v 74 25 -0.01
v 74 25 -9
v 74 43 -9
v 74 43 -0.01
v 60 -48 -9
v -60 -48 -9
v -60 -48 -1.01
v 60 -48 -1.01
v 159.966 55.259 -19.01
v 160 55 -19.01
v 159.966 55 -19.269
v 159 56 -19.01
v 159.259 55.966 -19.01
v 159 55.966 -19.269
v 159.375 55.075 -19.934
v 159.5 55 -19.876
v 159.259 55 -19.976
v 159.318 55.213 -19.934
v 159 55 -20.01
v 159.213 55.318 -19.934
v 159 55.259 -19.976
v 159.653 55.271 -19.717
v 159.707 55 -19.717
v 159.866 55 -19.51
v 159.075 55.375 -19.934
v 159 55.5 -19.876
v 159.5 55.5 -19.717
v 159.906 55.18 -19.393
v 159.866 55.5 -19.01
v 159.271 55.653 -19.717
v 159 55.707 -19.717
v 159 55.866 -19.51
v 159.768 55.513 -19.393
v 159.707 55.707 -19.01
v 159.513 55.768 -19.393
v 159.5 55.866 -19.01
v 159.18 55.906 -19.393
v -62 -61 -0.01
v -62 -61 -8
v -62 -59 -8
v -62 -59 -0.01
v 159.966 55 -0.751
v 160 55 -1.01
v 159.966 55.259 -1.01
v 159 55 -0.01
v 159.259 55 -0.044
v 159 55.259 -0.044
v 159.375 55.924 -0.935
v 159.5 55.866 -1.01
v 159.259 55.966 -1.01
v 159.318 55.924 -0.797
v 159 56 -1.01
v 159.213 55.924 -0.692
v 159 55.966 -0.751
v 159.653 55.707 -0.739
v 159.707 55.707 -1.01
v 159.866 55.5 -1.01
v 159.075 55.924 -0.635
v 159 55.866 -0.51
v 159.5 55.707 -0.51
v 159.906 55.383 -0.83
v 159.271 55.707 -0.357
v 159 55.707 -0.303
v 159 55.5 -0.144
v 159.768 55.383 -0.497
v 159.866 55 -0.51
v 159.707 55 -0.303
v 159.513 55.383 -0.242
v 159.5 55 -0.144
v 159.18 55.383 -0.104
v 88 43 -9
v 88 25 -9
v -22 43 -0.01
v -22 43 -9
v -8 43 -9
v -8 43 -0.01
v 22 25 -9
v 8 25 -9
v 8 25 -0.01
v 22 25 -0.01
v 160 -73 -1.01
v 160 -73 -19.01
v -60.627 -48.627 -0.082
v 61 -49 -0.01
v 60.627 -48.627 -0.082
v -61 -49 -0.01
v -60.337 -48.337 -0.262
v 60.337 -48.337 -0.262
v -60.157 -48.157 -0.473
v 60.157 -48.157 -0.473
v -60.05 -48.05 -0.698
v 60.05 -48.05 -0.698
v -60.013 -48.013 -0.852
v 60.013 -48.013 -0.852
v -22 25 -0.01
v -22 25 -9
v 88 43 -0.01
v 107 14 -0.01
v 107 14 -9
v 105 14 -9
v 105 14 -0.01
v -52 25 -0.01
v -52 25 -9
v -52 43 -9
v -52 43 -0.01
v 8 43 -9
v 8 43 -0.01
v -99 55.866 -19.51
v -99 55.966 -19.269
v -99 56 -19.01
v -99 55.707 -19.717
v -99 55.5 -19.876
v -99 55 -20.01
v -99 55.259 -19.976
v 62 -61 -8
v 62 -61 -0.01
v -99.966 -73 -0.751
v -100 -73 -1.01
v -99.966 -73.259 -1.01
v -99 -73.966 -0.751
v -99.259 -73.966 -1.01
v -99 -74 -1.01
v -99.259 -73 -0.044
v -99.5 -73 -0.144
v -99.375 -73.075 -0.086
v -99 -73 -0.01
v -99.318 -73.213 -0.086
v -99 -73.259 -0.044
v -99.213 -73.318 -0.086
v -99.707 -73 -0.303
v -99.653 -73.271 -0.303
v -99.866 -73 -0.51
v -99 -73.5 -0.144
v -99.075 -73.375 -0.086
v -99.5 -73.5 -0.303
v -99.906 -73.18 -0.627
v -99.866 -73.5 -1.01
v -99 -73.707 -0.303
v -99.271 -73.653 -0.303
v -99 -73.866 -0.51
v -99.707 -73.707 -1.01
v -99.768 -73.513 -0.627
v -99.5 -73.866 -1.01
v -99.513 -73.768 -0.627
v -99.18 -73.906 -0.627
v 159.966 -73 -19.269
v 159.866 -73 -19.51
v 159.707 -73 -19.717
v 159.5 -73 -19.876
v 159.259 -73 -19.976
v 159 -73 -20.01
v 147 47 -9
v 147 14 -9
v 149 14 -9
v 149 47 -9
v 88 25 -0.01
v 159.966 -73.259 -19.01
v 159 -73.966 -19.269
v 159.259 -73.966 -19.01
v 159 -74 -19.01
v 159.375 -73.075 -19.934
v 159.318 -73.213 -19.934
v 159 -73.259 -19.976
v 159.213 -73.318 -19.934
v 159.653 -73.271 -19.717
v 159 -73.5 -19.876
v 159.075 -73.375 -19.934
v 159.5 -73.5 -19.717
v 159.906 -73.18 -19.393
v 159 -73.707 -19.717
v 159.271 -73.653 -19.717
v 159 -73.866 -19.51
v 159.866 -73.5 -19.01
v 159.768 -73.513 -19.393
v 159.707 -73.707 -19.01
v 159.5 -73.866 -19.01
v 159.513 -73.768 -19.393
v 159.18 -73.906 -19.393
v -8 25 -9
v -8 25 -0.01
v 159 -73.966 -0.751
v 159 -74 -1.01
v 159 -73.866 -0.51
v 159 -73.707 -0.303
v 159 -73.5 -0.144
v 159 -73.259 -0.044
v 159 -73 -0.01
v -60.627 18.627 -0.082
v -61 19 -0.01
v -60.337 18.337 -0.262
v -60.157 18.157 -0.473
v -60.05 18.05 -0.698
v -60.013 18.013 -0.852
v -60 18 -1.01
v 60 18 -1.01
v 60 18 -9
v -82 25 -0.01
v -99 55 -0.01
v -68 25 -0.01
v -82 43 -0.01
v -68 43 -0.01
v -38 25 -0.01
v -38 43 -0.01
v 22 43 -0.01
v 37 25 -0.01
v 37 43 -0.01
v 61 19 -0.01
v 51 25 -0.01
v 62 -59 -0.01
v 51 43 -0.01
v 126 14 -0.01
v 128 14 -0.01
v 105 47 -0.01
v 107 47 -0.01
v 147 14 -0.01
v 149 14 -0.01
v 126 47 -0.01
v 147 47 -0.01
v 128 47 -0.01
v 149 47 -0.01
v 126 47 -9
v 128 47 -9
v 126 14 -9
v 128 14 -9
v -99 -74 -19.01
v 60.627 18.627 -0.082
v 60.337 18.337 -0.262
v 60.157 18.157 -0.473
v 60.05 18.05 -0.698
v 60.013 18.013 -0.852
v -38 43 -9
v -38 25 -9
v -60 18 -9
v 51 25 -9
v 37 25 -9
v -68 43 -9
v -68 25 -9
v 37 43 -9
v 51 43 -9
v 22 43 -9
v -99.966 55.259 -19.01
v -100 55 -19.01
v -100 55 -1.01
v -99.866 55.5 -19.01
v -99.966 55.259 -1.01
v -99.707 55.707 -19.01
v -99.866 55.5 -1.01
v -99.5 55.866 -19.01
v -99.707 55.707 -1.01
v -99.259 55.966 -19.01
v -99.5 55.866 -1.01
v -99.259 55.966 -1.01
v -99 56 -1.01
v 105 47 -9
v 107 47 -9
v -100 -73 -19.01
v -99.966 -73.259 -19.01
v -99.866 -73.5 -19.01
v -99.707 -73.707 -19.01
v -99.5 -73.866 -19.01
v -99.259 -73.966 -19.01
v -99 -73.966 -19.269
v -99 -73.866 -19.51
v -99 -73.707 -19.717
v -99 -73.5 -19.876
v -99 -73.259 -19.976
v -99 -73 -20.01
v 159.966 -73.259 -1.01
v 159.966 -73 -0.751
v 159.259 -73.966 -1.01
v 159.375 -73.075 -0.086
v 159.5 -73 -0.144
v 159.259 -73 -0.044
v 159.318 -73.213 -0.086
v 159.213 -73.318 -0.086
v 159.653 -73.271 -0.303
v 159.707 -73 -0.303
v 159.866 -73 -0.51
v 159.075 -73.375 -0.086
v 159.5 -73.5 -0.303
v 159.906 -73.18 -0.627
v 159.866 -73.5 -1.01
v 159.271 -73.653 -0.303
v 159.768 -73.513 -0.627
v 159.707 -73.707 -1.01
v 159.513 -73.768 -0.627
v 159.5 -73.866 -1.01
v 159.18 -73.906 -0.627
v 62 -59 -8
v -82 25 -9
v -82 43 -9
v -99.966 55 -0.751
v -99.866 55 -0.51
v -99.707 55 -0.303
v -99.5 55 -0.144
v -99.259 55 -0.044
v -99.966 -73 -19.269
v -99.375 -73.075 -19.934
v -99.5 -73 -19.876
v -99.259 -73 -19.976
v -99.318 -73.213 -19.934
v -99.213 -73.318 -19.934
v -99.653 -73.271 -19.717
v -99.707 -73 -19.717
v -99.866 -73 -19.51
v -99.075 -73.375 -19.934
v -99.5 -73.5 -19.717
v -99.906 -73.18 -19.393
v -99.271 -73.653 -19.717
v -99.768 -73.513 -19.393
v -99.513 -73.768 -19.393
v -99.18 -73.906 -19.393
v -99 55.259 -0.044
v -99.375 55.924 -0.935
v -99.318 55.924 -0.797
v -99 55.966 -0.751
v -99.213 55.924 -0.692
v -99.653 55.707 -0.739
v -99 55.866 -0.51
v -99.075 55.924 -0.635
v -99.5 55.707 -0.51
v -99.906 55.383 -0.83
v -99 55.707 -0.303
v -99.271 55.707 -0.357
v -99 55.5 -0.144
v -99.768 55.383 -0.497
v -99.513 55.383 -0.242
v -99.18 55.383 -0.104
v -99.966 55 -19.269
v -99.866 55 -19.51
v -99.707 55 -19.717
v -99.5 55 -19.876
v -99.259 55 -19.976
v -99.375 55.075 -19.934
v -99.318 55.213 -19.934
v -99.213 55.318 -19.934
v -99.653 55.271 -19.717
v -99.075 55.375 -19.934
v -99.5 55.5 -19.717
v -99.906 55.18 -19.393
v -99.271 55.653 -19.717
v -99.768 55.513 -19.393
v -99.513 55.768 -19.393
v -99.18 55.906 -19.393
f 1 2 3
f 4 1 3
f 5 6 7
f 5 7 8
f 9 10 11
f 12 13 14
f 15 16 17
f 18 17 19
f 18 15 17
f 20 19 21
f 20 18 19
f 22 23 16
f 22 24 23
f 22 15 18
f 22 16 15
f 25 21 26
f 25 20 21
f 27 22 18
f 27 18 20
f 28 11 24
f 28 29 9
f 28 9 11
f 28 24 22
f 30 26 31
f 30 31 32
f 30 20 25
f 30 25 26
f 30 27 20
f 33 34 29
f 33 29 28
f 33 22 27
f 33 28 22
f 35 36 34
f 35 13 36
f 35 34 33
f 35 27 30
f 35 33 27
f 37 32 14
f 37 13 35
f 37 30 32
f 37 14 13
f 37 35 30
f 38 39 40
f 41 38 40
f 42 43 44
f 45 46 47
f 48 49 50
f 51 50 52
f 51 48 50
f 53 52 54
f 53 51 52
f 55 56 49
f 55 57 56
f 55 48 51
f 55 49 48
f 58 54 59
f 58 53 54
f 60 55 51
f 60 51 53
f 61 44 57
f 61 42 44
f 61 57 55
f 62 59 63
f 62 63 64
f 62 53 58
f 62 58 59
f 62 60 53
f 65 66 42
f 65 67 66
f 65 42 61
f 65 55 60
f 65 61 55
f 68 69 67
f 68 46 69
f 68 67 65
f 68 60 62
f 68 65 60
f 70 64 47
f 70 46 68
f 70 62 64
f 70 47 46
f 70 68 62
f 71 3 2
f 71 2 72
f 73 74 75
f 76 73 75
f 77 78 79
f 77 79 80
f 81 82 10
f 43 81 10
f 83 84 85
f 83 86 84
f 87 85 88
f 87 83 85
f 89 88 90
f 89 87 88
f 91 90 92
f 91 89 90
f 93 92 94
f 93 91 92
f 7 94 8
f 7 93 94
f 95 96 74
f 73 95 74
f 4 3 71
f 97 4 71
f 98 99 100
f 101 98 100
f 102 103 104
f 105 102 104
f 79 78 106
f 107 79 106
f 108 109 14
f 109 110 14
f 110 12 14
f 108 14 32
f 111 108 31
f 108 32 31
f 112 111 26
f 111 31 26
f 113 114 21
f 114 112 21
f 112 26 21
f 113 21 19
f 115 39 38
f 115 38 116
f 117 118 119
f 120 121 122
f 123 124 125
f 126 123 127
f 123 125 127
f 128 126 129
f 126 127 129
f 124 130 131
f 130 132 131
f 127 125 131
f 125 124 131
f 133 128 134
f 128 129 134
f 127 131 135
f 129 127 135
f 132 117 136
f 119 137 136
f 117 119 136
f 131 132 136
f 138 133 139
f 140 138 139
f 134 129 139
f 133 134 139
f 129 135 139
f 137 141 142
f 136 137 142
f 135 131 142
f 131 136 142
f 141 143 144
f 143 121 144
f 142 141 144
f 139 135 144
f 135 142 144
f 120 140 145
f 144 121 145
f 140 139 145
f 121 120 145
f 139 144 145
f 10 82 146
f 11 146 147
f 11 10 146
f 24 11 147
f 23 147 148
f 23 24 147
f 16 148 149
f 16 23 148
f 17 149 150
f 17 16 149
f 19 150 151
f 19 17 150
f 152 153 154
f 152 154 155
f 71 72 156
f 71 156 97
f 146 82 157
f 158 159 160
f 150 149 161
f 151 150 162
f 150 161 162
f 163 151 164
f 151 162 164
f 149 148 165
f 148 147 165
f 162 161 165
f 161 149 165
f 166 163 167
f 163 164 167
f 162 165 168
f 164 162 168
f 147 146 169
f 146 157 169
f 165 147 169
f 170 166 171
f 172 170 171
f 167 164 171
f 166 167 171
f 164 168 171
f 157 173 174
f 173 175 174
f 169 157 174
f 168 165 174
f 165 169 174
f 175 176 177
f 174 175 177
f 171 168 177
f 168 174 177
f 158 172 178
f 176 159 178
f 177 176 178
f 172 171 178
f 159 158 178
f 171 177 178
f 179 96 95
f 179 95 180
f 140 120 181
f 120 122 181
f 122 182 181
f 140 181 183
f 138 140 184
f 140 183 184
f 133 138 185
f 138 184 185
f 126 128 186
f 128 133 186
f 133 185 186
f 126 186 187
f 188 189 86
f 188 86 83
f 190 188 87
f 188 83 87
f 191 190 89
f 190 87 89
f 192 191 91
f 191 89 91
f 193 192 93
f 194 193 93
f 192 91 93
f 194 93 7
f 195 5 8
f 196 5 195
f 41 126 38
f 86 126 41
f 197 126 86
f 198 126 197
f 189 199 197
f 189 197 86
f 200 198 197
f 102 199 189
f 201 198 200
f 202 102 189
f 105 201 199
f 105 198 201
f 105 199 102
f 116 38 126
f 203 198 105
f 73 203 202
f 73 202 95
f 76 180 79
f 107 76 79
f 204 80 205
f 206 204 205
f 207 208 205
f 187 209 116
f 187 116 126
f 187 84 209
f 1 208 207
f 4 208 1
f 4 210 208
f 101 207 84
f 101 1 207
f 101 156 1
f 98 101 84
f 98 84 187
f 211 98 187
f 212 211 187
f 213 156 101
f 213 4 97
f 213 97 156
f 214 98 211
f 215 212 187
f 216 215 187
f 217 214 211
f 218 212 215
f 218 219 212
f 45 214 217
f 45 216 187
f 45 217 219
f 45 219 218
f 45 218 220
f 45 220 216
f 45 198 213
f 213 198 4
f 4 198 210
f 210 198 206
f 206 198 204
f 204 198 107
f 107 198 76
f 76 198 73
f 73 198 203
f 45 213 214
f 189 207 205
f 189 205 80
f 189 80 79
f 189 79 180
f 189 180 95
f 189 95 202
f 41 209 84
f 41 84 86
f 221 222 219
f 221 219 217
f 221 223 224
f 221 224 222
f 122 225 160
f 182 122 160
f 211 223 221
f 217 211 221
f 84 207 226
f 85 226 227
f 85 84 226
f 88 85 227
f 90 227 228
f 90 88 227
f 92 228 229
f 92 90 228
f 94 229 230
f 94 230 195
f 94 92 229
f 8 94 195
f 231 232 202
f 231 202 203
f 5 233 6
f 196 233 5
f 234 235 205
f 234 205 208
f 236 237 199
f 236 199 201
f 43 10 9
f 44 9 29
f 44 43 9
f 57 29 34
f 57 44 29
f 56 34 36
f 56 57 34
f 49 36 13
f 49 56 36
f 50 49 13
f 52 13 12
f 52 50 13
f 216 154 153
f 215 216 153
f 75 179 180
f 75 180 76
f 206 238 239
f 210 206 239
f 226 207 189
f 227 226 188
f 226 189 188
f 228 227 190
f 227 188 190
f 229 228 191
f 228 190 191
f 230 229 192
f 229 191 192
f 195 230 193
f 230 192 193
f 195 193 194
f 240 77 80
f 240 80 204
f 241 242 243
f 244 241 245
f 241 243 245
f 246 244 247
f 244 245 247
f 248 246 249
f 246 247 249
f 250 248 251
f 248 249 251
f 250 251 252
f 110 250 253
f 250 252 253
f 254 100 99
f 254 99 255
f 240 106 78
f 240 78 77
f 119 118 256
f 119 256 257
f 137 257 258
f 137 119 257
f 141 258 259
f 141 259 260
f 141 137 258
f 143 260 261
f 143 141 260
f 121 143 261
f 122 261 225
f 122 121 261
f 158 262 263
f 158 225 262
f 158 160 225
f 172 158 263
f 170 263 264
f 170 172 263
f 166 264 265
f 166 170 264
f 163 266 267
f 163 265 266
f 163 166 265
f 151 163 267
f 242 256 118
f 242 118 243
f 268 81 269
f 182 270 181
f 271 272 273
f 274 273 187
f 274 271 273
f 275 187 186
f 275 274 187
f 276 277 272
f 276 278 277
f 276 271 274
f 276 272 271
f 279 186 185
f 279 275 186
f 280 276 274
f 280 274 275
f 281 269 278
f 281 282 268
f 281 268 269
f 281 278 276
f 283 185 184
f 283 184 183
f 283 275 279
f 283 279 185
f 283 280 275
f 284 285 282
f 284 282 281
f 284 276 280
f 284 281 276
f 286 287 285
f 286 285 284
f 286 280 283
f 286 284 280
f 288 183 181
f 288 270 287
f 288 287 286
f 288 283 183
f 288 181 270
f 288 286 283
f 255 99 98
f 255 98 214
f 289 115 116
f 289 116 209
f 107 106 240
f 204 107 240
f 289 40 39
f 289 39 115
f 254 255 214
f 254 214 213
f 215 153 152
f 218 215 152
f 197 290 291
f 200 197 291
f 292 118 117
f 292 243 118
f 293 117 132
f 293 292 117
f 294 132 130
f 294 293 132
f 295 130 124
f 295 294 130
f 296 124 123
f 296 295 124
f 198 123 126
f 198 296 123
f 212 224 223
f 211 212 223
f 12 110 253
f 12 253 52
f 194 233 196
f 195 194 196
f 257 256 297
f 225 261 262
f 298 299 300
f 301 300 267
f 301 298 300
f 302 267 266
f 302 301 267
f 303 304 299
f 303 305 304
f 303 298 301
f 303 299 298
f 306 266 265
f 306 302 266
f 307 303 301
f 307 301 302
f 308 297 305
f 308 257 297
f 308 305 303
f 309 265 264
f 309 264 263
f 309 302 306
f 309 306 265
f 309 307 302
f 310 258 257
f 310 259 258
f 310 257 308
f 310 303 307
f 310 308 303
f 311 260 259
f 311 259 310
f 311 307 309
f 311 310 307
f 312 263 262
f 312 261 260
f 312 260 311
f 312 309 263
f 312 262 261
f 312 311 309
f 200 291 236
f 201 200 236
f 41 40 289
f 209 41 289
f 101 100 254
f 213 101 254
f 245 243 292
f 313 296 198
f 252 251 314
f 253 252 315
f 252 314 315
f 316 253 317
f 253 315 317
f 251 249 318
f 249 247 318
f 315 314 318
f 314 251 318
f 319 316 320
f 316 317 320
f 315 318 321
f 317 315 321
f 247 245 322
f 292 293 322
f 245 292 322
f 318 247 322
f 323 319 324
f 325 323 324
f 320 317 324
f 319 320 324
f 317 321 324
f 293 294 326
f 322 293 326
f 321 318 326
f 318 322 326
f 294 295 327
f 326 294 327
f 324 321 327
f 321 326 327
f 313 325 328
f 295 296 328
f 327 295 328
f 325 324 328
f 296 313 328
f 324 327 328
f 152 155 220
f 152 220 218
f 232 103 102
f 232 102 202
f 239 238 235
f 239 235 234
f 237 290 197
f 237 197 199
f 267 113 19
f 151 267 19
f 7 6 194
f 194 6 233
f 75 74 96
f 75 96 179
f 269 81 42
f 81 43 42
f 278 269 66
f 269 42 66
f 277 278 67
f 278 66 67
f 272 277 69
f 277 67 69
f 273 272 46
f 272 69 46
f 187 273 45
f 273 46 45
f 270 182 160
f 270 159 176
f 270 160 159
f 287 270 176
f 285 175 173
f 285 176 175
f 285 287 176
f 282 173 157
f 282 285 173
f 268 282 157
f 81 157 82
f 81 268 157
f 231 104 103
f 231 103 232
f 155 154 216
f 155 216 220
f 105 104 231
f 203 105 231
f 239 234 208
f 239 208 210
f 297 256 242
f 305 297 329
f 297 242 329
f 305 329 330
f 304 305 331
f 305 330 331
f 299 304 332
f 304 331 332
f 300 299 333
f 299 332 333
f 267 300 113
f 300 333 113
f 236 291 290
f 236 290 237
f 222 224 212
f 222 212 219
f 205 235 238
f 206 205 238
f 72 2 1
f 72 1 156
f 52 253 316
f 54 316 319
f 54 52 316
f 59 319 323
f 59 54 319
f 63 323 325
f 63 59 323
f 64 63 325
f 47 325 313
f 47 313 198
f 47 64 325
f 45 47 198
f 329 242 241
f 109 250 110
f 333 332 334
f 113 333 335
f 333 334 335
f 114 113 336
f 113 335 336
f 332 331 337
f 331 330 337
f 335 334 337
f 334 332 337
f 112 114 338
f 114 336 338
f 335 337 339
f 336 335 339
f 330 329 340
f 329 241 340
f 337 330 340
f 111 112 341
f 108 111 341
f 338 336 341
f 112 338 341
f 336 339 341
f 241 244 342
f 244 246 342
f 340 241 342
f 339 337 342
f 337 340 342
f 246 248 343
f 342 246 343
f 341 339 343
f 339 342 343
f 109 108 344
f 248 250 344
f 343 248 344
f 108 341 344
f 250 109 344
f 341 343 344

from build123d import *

# Parameters (mm, degrees)
BOX013_W               = 120
BOX013_H               = 66
BOX013_DEPTH           = 10
BOX002_W               = 14
BOX002_H               = 18
BOX002_DEPTH           = 10
BOX003_W               = 14
BOX003_H               = 18
BOX003_DEPTH           = 10
BOX004_W               = 14
BOX004_H               = 18
BOX004_DEPTH           = 10
BOX005_W               = 14
BOX005_H               = 18
BOX005_DEPTH           = 10
BOX006_W               = 33
BOX006_H               = 2
BOX006_DEPTH           = 10
BOX006_PLACEMENT_ANGLE = 90
BOX009_W               = 33
BOX009_H               = 2
BOX009_DEPTH           = 10
BOX009_PLACEMENT_ANGLE = 90
BOX010_W               = 33
BOX010_H               = 2
BOX010_DEPTH           = 10
BOX010_PLACEMENT_ANGLE = 90
BOX015_W               = 14
BOX015_H               = 18
BOX015_DEPTH           = 10
BOX022_W               = 14
BOX022_H               = 18
BOX022_DEPTH           = 10
BOX001_W               = 124
BOX001_H               = 2
BOX001_DEPTH           = 10
BOX_W                  = 260
BOX_H                  = 130
BOX_DEPTH              = 20
FILLET004_R            = 1
FILLET_R               = 1


with BuildPart() as cube003:
    # Box013 → Box013 (new body)
    with BuildSketch(Plane(origin=(-60, -48, -9), x_dir=(1, 0, 0), z_dir=(0, 0, 1))):
        with Locations((60, 33)):
            Rectangle(BOX013_W, BOX013_H)
    extrude(amount=BOX013_DEPTH)


with BuildPart() as btn4_hole:
    # Box002 → Box002 (new body)
    with BuildSketch(Plane(origin=(8, 25, -9), x_dir=(1, 0, 0), z_dir=(0, 0, 1))):
        with Locations((7, 9)):
            Rectangle(BOX002_W, BOX002_H)
    extrude(amount=BOX002_DEPTH)


with BuildPart() as btn3_hole:
    # Box003 → Box003 (new body)
    with BuildSketch(Plane(origin=(-22, 25, -9), x_dir=(1, 0, 0), z_dir=(0, 0, 1))):
        with Locations((7, 9)):
            Rectangle(BOX003_W, BOX003_H)
    extrude(amount=BOX003_DEPTH)


with BuildPart() as btn2_hole:
    # Box004 → Box004 (new body)
    with BuildSketch(Plane(origin=(-52, 25, -9), x_dir=(1, 0, 0), z_dir=(0, 0, 1))):
        with Locations((7, 9)):
            Rectangle(BOX004_W, BOX004_H)
    extrude(amount=BOX004_DEPTH)


with BuildPart() as btn1_hole:
    # Box005 → Box005 (new body)
    with BuildSketch(Plane(origin=(-82, 25, -9), x_dir=(1, 0, 0), z_dir=(0, 0, 1))):
        with Locations((7, 9)):
            Rectangle(BOX005_W, BOX005_H)
    extrude(amount=BOX005_DEPTH)


with BuildPart() as cf_red_hole:
    # Box006 → Box006 (new body)
    with BuildSketch(Plane.XY):
        with Locations((16.5, 1)):
            Rectangle(BOX006_W, BOX006_H)
    extrude(amount=BOX006_DEPTH)


with BuildPart() as cf_red_hole_1:
    # Box006 placement: moved
    add(cf_red_hole.part.moved(Location((107, 14, -9))).rotate(Axis((107, 14, -9), (0, 0, 1)), BOX006_PLACEMENT_ANGLE))


with BuildPart() as cf_green_hole:
    # Box009 → Box009 (new body)
    with BuildSketch(Plane.XY):
        with Locations((16.5, 1)):
            Rectangle(BOX009_W, BOX009_H)
    extrude(amount=BOX009_DEPTH)


with BuildPart() as cf_green_hole_1:
    # Box009 placement: moved
    add(cf_green_hole.part.moved(Location((128, 14, -9))).rotate(Axis((128, 14, -9), (0, 0, 1)), BOX009_PLACEMENT_ANGLE))


with BuildPart() as cf_blue_hole:
    # Box010 → Box010 (new body)
    with BuildSketch(Plane.XY):
        with Locations((16.5, 1)):
            Rectangle(BOX010_W, BOX010_H)
    extrude(amount=BOX010_DEPTH)


with BuildPart() as cf_blue_hole_1:
    # Box010 placement: moved
    add(cf_blue_hole.part.moved(Location((149, 14, -9))).rotate(Axis((149, 14, -9), (0, 0, 1)), BOX010_PLACEMENT_ANGLE))


with BuildPart() as modbtnhole:
    # Box015 → Box015 (new body)
    with BuildSketch(Plane(origin=(74, 25, -9), x_dir=(1, 0, 0), z_dir=(0, 0, 1))):
        with Locations((7, 9)):
            Rectangle(BOX015_W, BOX015_H)
    extrude(amount=BOX015_DEPTH)


with BuildPart() as btn5_hole:
    # Box022 → Box022 (new body)
    with BuildSketch(Plane(origin=(37, 25, -9), x_dir=(1, 0, 0), z_dir=(0, 0, 1))):
        with Locations((7, 9)):
            Rectangle(BOX022_W, BOX022_H)
    extrude(amount=BOX022_DEPTH)


with BuildPart() as holes:
    # Box001 → Box001 (new body)
    with BuildSketch(Plane(origin=(-62, -61, -8), x_dir=(1, 0, 0), z_dir=(0, 0, 1))):
        with Locations((62, 1)):
            Rectangle(BOX001_W, BOX001_H)
    extrude(amount=BOX001_DEPTH)

    # Fusion: union Btn4-Hole, Btn3-Hole, Btn2-Hole, Btn1-Hole, CF-Red-Hole, CF-Green-Hole, CF-Blue-Hole, ModBtnHole, Btn5-Hole
    add(btn4_hole.part)
    add(btn3_hole.part)
    add(btn2_hole.part)
    add(btn1_hole.part)
    add(cf_red_hole_1.part)
    add(cf_green_hole_1.part)
    add(cf_blue_hole_1.part)
    add(modbtnhole.part)
    add(btn5_hole.part)


with BuildPart() as box:
    # Box → Box (new body)
    with BuildSketch(Plane(origin=(-100, -74, -20.01), x_dir=(1, 0, 0), z_dir=(0, 0, 1))):
        with Locations((130, 65)):
            Rectangle(BOX_W, BOX_H)
    extrude(amount=BOX_DEPTH)

    # Fillet004
    fillet004_edges = [box.edges().sort_by_distance(p)[0] for p in [
        (-100, -74, -10.01),
        (-100, -9, -0.01),
        (-100, 56, -10.01),
        (-100, -9, -20.01),
        (160, -74, -10.01),
        (160, -9, -0.01),
        (160, 56, -10.01),
        (160, -9, -20.01),
        (30, -74, -20.01),
        (30, -74, -0.01),
        (30, 56, -20.01),
        (30, 56, -0.01),
    ]]
    fillet(fillet004_edges, radius=FILLET004_R)

    # Cut016: cut Holes
    add(holes.part, mode=Mode.SUBTRACT)

    # Cut: cut Cube003
    add(cube003.part, mode=Mode.SUBTRACT)

    # Fillet
    fillet_edges = [box.edges().sort_by_distance(p)[0] for p in [
        (0, -48, -0.01),
        (60, -15, -0.01),
        (0, 18, -0.01),
        (-60, -15, -0.01),
    ]]
    fillet(fillet_edges, radius=FILLET_R)


solid = box.part
